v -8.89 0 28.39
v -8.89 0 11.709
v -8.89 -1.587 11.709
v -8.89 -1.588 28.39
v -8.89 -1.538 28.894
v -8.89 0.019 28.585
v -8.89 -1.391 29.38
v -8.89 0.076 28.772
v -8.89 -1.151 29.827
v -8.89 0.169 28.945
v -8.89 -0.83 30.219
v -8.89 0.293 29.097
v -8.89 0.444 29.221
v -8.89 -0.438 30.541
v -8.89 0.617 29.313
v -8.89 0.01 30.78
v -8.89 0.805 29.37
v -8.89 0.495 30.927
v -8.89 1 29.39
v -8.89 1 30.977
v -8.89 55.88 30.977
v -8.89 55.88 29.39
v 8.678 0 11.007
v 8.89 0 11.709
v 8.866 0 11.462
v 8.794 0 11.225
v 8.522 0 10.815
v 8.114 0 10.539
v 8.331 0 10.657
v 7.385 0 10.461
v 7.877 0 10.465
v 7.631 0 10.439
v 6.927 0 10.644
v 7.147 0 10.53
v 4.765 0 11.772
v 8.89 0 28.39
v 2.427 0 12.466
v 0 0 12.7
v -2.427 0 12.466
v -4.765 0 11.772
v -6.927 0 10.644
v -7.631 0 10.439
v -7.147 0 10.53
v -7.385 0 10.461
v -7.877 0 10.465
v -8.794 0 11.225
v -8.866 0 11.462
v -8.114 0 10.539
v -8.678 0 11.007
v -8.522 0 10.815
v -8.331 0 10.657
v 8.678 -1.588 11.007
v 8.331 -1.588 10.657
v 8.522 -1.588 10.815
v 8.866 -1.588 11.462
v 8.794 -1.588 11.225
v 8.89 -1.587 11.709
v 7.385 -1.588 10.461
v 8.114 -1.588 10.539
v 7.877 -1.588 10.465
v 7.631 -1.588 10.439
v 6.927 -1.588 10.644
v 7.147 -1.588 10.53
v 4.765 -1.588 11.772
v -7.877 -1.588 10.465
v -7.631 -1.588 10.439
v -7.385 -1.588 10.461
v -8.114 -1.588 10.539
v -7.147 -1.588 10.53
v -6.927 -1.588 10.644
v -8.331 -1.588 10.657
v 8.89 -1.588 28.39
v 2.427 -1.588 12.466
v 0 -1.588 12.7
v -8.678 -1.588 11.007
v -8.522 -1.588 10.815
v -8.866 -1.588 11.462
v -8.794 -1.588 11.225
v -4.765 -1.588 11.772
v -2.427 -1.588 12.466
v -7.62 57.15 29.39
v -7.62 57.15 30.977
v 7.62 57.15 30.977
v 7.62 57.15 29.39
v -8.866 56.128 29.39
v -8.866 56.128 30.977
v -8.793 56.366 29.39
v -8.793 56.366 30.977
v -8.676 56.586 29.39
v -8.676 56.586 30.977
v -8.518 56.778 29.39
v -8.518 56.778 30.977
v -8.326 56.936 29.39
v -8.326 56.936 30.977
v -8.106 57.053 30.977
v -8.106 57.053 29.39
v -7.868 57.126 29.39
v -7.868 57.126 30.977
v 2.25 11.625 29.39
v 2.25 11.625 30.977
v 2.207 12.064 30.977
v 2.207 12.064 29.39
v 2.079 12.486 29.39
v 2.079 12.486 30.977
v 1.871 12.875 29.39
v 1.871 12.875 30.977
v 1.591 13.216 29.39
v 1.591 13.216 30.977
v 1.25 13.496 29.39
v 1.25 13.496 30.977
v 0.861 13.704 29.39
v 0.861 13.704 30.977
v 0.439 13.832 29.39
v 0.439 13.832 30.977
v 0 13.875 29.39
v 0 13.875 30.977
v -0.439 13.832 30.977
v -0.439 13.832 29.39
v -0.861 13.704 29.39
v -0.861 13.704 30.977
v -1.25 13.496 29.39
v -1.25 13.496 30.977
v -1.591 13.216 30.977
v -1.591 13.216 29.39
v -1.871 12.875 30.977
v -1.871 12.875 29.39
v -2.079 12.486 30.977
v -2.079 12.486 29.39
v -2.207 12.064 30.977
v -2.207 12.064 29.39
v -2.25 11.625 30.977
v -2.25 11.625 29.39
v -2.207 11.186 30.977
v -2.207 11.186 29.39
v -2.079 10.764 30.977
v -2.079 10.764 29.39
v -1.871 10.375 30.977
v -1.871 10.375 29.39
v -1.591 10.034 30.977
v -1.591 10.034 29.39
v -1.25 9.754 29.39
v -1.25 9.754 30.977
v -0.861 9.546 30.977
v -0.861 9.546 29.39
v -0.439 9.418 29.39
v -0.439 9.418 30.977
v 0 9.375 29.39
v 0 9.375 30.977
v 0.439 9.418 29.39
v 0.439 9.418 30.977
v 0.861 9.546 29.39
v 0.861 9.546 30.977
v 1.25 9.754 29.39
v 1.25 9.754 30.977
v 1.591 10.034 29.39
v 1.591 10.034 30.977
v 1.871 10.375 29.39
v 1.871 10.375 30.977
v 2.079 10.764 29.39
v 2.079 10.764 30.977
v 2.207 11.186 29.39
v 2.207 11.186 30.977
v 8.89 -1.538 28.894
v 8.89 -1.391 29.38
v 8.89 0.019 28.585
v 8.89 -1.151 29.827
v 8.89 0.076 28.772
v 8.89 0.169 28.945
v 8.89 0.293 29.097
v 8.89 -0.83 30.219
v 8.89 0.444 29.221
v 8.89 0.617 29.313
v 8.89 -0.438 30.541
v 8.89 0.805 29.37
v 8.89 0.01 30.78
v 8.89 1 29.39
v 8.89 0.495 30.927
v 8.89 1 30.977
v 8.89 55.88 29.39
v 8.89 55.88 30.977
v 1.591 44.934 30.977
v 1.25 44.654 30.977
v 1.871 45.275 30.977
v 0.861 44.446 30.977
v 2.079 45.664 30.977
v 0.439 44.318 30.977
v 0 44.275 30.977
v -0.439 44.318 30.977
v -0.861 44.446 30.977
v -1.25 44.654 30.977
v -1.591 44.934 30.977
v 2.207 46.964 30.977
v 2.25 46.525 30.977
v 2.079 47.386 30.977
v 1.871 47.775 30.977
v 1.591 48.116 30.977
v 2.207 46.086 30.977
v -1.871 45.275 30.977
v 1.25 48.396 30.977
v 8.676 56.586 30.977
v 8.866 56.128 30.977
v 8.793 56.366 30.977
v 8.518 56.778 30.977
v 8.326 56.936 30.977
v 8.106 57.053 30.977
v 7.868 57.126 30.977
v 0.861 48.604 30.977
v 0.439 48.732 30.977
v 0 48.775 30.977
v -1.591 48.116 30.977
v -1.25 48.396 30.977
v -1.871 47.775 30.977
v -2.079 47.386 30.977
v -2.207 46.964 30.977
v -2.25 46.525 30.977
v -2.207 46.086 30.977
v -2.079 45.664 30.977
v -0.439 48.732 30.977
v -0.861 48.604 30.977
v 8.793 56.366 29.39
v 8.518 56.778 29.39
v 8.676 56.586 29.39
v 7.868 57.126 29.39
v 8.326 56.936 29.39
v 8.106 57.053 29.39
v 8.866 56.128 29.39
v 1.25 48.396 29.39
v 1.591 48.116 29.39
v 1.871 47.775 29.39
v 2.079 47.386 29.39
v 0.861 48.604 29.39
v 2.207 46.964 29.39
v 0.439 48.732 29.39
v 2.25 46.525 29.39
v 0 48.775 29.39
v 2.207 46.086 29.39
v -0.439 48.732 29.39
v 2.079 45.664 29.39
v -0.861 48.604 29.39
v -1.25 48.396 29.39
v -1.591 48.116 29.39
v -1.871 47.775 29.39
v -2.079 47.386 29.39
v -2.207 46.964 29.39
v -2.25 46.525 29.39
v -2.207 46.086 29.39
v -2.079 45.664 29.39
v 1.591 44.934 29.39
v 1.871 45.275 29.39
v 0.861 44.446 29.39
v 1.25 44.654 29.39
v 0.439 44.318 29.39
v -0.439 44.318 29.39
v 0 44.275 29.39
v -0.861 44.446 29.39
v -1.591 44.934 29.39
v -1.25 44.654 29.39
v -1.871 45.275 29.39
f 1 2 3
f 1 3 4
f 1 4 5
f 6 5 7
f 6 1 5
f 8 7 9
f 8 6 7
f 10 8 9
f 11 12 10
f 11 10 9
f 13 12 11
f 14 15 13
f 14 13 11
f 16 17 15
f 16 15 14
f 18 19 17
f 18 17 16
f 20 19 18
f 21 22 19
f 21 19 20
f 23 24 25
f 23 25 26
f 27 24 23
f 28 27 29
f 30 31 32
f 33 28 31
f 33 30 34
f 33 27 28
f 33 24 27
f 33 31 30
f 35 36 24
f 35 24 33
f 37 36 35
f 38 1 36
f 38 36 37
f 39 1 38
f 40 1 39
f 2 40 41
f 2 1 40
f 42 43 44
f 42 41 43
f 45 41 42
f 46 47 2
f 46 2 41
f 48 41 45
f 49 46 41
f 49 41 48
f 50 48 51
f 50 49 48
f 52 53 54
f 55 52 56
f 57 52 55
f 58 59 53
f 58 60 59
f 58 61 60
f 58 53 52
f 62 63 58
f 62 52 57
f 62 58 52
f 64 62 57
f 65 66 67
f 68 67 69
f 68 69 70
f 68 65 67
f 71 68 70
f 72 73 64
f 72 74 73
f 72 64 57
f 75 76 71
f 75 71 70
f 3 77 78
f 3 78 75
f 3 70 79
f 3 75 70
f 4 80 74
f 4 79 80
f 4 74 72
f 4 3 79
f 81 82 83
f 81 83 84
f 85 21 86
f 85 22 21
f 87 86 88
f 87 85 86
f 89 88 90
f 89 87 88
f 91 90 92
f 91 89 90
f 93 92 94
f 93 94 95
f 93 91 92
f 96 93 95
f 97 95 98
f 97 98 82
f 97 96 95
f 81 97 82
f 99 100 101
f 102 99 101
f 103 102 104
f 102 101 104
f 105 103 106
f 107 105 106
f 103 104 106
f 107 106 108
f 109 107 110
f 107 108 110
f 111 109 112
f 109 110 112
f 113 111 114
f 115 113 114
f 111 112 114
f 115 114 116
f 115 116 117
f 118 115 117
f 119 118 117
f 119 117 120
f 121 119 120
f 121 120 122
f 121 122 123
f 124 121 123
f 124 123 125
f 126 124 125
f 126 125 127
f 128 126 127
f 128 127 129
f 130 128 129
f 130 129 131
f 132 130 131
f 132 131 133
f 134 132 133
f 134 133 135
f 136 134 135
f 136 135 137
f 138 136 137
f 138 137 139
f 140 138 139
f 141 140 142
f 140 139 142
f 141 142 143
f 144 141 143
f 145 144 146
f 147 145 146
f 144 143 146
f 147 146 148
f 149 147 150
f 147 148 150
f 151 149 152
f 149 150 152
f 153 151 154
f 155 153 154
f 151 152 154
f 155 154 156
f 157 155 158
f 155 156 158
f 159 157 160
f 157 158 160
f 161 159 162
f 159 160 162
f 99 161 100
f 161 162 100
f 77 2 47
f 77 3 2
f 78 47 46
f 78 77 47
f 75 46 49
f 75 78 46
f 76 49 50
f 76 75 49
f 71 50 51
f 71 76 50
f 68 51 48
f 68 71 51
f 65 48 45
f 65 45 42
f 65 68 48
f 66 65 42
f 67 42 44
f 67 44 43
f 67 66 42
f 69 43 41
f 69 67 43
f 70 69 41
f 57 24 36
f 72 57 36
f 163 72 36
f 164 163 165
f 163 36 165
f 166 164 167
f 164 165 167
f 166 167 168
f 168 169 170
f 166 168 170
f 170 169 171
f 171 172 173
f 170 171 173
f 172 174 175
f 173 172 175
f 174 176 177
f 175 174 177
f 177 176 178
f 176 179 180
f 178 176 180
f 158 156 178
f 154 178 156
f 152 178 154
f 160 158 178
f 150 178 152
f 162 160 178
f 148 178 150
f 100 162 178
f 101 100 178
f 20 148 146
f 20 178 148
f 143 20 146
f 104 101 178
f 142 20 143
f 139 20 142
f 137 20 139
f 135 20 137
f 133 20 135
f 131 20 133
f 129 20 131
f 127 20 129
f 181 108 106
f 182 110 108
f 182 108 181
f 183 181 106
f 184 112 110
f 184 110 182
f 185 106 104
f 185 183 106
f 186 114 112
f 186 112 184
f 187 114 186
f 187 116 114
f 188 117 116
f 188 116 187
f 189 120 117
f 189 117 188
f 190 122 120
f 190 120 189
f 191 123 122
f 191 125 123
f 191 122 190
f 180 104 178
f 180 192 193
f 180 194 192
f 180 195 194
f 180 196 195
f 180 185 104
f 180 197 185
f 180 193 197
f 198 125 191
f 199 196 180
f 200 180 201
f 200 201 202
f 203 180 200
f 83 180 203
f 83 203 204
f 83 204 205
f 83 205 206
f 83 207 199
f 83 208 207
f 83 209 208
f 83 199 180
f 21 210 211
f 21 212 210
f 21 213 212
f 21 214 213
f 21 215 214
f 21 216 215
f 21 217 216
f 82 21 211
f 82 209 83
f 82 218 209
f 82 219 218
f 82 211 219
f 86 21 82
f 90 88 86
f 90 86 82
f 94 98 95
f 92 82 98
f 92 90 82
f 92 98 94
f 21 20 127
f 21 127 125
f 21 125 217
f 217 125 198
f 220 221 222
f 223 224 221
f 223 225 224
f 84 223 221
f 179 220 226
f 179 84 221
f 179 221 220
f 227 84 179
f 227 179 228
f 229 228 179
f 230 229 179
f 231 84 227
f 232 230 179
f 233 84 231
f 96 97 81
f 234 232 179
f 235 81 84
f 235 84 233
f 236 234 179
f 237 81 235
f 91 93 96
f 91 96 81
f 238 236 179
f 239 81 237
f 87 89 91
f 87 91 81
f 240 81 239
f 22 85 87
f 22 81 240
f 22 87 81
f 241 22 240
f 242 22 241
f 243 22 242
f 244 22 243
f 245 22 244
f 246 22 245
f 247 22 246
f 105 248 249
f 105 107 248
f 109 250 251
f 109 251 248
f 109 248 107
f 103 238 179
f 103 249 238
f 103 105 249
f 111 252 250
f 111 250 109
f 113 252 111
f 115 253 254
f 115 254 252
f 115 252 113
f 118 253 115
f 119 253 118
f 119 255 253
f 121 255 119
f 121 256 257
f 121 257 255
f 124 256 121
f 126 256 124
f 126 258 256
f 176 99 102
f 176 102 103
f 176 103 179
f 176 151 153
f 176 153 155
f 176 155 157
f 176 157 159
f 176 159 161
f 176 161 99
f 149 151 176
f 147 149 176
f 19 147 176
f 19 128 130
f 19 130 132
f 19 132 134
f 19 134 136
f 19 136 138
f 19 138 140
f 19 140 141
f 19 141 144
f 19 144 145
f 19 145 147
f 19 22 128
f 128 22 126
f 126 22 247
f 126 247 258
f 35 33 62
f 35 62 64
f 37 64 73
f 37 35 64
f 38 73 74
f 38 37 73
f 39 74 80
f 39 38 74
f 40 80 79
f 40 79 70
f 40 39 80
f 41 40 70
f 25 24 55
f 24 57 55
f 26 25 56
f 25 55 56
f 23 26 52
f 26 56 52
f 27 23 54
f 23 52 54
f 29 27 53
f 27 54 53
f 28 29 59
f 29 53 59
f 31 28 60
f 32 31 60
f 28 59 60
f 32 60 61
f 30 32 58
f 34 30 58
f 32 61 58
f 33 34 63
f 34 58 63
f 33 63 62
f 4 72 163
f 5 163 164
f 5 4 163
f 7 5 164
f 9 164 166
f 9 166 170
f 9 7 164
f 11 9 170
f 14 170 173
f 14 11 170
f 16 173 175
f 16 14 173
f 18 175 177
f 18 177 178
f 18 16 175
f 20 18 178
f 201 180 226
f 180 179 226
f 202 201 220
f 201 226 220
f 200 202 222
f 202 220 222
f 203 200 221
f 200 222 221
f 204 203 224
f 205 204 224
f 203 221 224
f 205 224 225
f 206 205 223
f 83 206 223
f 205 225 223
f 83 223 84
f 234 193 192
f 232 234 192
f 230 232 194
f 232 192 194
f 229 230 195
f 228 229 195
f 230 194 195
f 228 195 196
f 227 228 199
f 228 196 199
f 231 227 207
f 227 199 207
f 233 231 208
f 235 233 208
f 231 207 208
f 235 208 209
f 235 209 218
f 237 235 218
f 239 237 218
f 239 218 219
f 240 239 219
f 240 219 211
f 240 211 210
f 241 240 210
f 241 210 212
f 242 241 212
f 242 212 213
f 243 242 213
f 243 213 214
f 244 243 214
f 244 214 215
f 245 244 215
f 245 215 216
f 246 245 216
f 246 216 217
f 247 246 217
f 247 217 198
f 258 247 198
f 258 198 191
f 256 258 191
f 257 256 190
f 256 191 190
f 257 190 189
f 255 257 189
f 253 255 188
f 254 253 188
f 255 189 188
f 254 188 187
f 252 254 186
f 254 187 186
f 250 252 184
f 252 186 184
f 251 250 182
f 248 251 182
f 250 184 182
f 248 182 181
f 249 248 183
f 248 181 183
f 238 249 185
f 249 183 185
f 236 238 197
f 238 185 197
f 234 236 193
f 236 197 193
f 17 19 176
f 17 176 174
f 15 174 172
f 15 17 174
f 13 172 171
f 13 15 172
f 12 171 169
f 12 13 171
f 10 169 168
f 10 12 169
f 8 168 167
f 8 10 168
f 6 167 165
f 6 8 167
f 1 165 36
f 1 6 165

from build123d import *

# Parameters (mm, degrees)
BASE_FLANGE1_DEPTH   = 1.5875
EDGE_FLANGE1_DEPTH   = 17.78
M4_CLEARANCE_HOLE1_D = 4.5
FILLET1_R            = 1.27


# Sheet-metal steps are written as plain solids
with BuildPart() as part:
    # Sketch1 → Base-Flange1 (new body)
    with BuildSketch(Plane(origin=(0, 0, 0), x_dir=(1, 0, 0), z_dir=(0, 1, 0))):
        with BuildLine():
            Line((-8.89, -9.069614104), (-8.89, -28.119614104))
            Line((-8.89, -28.119614104), (8.89, -28.119614104))
            Line((8.89, -28.119614104), (8.89, -9.069614104))
            ThreePointArc((8.89, -9.069614104), (0, -12.7), (-8.89, -9.069614104))
        make_face()
    extrude(amount=-BASE_FLANGE1_DEPTH)

    # Edge-Flange1 section (across the edge) → Edge-Flange1 (add)
    with BuildSketch(Plane(origin=(-8.89, 0, 29.389614104), x_dir=(0, 0, -1), z_dir=(1, 0, 0))):
        with BuildLine():
            Line((-1.5875, 1), (-1.5875, 57.15))
            Line((-1.5875, 57.15), (0, 57.15))
            Line((0, 57.15), (0, 1))
            ThreePointArc((0, 1), (0.292893219, 0.292893219), (1, 0))
            Line((1, 0), (1.27, 0))
            Line((1.27, 0), (1.27, -1.5875))
            Line((1.27, -1.5875), (1, -1.5875))
            ThreePointArc((1, -1.5875), (-0.829638796, -0.829638796), (-1.5875, 1))
        make_face()
    extrude(amount=EDGE_FLANGE1_DEPTH)

    # M4 Clearance Hole1 (through all)
    with Locations(Plane(origin=(0, 0, 29.389614104), x_dir=(-1, 0, 0), z_dir=(0, 0, -1))):
        with Locations((0, 46.524999898), (0, 11.625)):
            Hole(M4_CLEARANCE_HOLE1_D / 2)

    # Fillet1
    fillet1_edges = [part.edges().sort_by_distance(p)[0] for p in [
        (-8.89, 57.15, 30.183364104),
        (8.89, 57.15, 30.183364104),
        (8.89, -0.79375, 9.069614104),
        (-8.89, -0.79375, 9.069614104),
    ]]
    fillet(fillet1_edges, radius=FILLET1_R)


solid = part.part
